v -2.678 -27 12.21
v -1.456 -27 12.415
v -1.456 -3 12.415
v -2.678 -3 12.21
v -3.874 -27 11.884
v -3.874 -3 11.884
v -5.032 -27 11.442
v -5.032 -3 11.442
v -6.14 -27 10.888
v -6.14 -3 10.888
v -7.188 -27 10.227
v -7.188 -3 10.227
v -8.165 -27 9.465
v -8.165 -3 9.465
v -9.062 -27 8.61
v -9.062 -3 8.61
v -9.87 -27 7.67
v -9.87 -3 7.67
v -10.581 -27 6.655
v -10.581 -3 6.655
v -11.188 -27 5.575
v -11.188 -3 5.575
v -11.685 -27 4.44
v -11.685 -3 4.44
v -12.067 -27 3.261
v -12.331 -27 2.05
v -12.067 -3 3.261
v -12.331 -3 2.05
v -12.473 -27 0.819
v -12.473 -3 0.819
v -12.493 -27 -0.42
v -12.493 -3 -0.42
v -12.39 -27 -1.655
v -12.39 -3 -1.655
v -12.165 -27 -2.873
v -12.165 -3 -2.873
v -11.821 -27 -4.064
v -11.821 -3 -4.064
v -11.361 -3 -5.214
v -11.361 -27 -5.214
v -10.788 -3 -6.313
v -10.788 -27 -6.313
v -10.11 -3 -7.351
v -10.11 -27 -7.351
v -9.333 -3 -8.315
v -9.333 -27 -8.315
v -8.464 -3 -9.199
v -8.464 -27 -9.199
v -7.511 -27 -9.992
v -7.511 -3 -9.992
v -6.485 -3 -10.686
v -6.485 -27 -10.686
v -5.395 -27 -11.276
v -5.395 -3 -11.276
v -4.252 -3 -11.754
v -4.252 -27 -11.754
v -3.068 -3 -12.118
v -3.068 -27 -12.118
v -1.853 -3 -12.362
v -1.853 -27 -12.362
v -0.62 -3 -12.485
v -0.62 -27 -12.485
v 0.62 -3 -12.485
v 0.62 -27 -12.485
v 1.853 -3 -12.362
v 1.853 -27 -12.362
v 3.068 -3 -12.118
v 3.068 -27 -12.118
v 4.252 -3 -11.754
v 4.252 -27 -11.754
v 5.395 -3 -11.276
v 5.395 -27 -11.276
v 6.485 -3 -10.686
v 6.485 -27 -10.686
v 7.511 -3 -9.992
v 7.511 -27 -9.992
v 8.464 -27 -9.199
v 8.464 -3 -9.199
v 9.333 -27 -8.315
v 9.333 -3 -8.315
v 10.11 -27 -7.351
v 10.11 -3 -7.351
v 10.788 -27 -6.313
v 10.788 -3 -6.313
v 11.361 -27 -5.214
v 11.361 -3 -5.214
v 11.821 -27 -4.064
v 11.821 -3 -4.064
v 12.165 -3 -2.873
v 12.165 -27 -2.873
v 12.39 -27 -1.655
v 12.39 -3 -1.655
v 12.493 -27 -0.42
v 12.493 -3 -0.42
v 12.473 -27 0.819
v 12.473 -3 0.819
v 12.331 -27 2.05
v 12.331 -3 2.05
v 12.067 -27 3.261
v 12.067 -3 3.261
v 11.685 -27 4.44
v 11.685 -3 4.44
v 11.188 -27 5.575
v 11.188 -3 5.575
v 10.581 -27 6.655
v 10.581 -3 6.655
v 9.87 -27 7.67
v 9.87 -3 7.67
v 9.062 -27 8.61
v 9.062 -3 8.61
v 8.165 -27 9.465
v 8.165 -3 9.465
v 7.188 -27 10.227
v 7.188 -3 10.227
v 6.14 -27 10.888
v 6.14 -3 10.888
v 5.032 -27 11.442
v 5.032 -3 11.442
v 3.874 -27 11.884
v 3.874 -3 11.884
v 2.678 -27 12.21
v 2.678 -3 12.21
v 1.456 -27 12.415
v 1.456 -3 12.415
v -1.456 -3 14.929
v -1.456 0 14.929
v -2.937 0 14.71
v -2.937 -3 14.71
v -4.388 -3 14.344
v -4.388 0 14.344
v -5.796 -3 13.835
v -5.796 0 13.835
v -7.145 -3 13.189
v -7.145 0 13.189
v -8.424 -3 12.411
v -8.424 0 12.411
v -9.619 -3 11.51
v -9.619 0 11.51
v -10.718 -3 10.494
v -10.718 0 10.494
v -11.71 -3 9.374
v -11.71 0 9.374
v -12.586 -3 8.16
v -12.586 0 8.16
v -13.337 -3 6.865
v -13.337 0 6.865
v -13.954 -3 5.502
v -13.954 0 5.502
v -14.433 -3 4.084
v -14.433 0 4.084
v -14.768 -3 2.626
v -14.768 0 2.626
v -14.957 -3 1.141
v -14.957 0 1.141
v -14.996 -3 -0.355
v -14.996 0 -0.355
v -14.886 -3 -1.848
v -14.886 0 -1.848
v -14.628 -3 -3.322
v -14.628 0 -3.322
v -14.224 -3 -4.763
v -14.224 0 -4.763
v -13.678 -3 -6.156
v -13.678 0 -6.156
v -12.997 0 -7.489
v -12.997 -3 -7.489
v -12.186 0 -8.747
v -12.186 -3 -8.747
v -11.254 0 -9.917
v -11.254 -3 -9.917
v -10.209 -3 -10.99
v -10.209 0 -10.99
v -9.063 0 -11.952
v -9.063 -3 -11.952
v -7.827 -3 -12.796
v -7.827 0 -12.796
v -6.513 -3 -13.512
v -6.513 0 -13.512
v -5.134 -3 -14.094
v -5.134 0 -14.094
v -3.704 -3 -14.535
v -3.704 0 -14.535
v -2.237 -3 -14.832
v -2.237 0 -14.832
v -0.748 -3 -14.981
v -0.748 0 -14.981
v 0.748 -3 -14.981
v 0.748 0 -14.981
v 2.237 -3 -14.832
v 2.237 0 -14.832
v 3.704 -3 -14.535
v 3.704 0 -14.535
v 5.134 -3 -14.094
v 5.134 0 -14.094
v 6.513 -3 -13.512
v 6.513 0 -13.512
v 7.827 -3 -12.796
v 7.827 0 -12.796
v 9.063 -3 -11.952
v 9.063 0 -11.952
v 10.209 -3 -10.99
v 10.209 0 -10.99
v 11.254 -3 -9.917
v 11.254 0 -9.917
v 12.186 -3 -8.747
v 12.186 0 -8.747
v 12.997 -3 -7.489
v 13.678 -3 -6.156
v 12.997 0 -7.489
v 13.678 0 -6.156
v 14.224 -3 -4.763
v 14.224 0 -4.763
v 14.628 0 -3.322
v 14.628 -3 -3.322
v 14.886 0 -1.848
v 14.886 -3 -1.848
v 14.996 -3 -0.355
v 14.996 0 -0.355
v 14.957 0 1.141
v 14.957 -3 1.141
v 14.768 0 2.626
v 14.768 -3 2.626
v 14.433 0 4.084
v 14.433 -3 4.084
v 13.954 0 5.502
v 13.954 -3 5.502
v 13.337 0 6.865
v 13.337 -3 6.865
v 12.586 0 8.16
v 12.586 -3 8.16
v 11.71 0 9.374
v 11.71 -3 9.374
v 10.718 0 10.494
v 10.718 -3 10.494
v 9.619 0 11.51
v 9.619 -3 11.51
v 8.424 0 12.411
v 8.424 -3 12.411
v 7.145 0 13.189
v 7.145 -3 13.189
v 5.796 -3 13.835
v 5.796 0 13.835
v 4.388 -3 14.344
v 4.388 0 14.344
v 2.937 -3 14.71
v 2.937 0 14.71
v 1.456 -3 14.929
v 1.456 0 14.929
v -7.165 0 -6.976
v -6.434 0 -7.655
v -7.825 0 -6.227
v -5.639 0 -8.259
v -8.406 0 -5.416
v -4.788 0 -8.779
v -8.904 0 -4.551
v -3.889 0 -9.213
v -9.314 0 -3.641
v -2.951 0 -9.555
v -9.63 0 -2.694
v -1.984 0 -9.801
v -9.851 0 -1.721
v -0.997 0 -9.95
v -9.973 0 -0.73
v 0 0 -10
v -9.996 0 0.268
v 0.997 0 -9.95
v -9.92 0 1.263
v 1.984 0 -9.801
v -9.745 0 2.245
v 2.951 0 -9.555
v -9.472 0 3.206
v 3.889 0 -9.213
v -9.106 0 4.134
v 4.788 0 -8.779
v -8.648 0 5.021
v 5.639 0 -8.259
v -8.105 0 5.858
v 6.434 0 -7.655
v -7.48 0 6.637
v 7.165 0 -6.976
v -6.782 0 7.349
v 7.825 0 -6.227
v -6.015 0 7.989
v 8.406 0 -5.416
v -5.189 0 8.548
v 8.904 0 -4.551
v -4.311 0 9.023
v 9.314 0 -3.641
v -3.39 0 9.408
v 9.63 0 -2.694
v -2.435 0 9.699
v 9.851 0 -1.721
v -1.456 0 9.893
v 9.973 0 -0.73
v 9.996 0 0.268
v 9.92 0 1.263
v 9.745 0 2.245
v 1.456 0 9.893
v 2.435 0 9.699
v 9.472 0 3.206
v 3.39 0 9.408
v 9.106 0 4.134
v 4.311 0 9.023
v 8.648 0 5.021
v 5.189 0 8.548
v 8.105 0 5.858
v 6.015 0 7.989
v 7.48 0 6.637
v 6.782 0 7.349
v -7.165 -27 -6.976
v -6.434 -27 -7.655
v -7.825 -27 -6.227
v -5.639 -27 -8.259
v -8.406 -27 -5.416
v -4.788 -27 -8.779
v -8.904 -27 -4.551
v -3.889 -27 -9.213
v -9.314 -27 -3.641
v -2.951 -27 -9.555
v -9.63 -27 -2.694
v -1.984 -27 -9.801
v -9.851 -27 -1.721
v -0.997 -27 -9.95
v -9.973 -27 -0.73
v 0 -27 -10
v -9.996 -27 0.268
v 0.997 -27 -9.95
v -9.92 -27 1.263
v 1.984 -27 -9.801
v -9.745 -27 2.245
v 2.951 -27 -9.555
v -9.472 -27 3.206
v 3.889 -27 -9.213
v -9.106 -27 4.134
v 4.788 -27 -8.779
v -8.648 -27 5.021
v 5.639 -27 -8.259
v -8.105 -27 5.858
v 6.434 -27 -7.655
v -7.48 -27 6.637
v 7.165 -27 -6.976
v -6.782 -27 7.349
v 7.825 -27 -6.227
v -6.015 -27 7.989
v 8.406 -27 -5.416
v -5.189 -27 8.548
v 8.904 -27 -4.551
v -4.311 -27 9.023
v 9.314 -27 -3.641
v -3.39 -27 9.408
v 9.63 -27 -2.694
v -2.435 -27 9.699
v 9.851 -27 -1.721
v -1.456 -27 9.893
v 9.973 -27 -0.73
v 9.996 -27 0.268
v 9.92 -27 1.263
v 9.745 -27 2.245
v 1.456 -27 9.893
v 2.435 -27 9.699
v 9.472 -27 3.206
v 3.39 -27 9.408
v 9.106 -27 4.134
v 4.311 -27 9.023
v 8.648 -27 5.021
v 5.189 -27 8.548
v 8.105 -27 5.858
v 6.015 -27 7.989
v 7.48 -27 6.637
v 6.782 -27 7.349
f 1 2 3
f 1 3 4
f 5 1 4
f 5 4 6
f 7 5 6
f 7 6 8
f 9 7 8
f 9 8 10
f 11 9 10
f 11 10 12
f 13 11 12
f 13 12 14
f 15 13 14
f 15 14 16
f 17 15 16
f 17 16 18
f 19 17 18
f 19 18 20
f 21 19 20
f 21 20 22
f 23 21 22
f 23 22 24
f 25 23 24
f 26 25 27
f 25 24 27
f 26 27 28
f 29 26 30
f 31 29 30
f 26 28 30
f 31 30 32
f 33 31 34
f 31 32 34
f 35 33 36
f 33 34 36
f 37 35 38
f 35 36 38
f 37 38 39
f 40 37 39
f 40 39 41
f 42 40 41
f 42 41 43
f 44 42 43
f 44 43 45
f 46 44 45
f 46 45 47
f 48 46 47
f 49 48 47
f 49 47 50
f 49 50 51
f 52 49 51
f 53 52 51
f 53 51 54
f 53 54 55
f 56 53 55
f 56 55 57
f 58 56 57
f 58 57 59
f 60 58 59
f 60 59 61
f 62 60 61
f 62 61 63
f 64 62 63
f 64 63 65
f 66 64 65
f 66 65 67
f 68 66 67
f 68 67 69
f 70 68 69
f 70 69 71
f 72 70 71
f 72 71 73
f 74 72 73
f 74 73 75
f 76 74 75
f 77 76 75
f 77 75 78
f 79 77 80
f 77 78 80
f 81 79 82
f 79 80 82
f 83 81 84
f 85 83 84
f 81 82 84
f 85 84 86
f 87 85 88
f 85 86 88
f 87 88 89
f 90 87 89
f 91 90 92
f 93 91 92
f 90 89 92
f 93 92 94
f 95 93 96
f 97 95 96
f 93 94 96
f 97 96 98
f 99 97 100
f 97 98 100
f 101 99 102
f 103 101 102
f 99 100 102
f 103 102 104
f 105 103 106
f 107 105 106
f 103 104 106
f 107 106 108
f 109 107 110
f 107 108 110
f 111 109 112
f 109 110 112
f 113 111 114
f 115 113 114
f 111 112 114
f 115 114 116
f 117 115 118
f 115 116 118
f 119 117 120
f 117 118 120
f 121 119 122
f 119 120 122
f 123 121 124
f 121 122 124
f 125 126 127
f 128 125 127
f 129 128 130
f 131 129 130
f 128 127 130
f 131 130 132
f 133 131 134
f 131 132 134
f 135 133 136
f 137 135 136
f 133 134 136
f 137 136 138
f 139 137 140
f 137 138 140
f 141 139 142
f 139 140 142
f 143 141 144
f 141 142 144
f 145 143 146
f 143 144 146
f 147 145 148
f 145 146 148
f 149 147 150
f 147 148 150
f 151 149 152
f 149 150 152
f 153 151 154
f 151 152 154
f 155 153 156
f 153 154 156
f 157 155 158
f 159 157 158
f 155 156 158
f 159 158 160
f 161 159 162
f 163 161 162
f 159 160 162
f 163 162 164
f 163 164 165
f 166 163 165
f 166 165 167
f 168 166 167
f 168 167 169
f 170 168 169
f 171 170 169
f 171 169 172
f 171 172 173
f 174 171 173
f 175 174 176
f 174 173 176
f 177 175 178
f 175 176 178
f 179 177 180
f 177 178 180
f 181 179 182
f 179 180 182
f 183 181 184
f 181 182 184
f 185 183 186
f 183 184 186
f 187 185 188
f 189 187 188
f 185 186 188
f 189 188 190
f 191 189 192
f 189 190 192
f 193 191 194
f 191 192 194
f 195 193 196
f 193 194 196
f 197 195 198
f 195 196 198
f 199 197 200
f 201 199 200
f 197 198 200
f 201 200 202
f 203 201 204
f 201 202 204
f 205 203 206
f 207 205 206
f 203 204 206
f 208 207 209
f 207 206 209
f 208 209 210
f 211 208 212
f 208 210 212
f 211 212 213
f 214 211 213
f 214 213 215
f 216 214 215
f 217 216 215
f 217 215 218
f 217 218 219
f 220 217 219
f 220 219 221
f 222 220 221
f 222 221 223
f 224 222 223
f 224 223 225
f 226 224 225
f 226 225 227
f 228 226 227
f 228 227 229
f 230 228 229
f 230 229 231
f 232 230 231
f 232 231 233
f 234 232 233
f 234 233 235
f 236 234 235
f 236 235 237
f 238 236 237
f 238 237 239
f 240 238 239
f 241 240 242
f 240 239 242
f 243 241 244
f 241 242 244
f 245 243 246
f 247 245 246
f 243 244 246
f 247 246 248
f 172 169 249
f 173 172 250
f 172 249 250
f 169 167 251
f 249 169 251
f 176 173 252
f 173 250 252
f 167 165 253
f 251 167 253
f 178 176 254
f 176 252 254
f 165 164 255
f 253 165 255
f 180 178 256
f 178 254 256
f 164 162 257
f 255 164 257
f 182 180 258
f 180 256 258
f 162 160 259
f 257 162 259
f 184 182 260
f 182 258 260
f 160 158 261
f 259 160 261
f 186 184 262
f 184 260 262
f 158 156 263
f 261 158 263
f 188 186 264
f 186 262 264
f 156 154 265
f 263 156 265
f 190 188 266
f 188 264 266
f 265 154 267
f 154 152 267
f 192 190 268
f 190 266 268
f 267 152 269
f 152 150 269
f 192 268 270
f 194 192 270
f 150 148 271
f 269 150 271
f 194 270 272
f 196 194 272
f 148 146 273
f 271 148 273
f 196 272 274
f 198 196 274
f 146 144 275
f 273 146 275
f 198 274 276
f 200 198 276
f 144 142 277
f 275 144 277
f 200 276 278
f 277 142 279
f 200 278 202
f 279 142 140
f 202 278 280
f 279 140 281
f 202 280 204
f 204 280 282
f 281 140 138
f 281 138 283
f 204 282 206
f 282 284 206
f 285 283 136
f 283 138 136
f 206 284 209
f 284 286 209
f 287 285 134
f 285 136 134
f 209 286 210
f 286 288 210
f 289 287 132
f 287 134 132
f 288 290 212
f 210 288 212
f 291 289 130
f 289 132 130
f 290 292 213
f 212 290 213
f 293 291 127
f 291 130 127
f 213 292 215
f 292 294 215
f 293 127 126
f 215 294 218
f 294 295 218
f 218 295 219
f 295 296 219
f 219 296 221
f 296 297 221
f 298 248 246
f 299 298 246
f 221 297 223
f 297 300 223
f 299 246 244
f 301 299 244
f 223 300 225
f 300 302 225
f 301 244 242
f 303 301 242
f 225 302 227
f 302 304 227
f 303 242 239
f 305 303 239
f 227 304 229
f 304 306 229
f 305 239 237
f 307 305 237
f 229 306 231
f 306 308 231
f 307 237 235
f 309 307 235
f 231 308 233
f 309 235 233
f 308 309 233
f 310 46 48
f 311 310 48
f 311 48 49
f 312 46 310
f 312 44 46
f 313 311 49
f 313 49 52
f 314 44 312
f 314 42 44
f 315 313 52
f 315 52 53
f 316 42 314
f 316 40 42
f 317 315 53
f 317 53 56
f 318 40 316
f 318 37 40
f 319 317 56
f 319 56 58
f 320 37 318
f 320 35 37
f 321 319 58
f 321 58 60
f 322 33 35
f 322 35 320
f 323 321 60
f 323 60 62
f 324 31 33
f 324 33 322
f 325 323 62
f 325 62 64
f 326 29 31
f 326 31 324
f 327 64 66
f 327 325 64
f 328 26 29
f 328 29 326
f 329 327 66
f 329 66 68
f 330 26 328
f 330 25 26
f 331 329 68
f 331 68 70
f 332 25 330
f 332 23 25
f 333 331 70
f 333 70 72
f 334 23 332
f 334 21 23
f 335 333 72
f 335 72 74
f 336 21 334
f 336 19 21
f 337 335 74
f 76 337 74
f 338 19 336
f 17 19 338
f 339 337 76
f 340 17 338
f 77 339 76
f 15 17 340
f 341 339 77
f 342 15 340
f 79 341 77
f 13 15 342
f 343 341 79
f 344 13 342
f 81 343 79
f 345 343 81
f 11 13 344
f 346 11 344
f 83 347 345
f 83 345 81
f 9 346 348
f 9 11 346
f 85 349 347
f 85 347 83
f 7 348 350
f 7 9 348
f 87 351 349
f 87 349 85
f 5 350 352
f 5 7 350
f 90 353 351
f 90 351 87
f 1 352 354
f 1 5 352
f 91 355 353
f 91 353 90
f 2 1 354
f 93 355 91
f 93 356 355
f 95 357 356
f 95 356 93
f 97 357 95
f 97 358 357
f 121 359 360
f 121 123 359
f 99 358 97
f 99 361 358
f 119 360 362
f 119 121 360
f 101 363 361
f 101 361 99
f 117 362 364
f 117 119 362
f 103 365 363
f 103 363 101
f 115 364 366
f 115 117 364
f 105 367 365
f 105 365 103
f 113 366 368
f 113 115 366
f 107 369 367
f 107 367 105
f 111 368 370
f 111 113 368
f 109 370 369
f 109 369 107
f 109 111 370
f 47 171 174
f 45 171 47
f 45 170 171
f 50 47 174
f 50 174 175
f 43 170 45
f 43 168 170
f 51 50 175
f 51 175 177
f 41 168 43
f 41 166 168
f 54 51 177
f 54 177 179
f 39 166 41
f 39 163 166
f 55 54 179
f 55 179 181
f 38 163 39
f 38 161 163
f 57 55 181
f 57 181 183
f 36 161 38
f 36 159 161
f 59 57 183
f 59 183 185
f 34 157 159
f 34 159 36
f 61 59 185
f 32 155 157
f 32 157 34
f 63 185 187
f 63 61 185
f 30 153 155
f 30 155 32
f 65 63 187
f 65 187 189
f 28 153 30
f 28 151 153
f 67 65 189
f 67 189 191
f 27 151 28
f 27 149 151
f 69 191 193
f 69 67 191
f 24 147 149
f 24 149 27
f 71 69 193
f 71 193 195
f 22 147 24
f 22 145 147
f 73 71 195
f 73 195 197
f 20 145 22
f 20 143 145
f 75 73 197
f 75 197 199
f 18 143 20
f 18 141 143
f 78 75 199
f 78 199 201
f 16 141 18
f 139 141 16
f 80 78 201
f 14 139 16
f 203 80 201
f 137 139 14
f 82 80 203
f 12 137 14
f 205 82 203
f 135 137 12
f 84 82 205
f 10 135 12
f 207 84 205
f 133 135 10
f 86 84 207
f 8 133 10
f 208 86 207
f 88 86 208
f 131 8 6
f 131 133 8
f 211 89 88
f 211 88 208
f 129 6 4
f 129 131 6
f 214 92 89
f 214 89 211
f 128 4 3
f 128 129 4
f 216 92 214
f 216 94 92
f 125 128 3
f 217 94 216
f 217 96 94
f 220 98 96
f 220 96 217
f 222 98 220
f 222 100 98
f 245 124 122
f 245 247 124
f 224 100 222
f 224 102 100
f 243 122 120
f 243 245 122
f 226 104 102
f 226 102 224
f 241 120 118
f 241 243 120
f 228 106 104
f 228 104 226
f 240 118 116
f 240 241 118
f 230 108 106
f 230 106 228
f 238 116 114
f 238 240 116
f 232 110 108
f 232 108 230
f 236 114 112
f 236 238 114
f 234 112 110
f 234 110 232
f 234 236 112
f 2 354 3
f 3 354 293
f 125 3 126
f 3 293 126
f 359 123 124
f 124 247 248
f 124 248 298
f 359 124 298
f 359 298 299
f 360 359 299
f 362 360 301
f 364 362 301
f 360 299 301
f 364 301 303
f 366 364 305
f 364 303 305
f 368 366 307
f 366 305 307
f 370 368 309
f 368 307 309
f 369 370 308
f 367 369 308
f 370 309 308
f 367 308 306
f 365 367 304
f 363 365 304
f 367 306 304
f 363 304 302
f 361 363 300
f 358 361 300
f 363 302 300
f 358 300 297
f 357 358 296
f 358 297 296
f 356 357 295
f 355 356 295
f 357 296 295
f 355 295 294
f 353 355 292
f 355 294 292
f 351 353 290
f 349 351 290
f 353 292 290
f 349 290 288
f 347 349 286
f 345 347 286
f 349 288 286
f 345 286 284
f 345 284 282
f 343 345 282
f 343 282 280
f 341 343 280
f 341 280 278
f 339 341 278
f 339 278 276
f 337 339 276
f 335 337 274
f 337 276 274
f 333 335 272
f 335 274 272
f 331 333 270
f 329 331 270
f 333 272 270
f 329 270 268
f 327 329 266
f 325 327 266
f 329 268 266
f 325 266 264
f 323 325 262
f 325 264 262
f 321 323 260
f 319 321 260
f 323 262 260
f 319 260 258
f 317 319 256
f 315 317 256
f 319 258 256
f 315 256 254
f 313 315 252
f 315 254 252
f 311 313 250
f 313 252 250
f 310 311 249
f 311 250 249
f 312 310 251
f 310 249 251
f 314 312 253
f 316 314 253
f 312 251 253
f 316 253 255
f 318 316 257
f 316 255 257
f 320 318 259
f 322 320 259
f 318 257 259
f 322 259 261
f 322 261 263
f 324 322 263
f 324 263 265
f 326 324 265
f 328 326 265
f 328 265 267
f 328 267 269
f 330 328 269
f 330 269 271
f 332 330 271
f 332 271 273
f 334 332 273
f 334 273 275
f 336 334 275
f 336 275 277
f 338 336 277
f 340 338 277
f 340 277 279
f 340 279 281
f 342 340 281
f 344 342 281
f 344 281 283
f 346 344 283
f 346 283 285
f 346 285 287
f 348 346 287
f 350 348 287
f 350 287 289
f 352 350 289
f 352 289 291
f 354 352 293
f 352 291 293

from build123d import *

# Parameters (mm, degrees)
F1_DEPTH = 27
F2_DEPTH = 3


with BuildPart() as f1:
    # F0 (on Front) → F1 (new body)
    with BuildSketch(Plane.XZ):
        with BuildLine():
            ThreePointArc((1.456403, 9.893376), (0, -10), (-1.456403, 9.893376))
            Line((-1.456403, 9.893376), (-1.456403, 12.414866))
            ThreePointArc((-1.456403, 12.414866), (0, -12.5), (1.456403, 12.414866))
            Line((1.456403, 12.414866), (1.456403, 9.893376))
        make_face()
    extrude(amount=F1_DEPTH)

    # F0 (on Front) → F2 (join)
    with BuildSketch(Plane.XZ):
        with BuildLine():
            ThreePointArc((1.456403, 12.414866), (0, -12.5), (-1.456403, 12.414866))
            Line((-1.456403, 12.414866), (-1.456403, 14.929129))
            ThreePointArc((-1.456403, 14.929129), (0, -15), (1.456403, 14.929129))
            Line((1.456403, 14.929129), (1.456403, 12.414866))
        make_face()
    extrude(amount=F2_DEPTH)


solid = f1.part
